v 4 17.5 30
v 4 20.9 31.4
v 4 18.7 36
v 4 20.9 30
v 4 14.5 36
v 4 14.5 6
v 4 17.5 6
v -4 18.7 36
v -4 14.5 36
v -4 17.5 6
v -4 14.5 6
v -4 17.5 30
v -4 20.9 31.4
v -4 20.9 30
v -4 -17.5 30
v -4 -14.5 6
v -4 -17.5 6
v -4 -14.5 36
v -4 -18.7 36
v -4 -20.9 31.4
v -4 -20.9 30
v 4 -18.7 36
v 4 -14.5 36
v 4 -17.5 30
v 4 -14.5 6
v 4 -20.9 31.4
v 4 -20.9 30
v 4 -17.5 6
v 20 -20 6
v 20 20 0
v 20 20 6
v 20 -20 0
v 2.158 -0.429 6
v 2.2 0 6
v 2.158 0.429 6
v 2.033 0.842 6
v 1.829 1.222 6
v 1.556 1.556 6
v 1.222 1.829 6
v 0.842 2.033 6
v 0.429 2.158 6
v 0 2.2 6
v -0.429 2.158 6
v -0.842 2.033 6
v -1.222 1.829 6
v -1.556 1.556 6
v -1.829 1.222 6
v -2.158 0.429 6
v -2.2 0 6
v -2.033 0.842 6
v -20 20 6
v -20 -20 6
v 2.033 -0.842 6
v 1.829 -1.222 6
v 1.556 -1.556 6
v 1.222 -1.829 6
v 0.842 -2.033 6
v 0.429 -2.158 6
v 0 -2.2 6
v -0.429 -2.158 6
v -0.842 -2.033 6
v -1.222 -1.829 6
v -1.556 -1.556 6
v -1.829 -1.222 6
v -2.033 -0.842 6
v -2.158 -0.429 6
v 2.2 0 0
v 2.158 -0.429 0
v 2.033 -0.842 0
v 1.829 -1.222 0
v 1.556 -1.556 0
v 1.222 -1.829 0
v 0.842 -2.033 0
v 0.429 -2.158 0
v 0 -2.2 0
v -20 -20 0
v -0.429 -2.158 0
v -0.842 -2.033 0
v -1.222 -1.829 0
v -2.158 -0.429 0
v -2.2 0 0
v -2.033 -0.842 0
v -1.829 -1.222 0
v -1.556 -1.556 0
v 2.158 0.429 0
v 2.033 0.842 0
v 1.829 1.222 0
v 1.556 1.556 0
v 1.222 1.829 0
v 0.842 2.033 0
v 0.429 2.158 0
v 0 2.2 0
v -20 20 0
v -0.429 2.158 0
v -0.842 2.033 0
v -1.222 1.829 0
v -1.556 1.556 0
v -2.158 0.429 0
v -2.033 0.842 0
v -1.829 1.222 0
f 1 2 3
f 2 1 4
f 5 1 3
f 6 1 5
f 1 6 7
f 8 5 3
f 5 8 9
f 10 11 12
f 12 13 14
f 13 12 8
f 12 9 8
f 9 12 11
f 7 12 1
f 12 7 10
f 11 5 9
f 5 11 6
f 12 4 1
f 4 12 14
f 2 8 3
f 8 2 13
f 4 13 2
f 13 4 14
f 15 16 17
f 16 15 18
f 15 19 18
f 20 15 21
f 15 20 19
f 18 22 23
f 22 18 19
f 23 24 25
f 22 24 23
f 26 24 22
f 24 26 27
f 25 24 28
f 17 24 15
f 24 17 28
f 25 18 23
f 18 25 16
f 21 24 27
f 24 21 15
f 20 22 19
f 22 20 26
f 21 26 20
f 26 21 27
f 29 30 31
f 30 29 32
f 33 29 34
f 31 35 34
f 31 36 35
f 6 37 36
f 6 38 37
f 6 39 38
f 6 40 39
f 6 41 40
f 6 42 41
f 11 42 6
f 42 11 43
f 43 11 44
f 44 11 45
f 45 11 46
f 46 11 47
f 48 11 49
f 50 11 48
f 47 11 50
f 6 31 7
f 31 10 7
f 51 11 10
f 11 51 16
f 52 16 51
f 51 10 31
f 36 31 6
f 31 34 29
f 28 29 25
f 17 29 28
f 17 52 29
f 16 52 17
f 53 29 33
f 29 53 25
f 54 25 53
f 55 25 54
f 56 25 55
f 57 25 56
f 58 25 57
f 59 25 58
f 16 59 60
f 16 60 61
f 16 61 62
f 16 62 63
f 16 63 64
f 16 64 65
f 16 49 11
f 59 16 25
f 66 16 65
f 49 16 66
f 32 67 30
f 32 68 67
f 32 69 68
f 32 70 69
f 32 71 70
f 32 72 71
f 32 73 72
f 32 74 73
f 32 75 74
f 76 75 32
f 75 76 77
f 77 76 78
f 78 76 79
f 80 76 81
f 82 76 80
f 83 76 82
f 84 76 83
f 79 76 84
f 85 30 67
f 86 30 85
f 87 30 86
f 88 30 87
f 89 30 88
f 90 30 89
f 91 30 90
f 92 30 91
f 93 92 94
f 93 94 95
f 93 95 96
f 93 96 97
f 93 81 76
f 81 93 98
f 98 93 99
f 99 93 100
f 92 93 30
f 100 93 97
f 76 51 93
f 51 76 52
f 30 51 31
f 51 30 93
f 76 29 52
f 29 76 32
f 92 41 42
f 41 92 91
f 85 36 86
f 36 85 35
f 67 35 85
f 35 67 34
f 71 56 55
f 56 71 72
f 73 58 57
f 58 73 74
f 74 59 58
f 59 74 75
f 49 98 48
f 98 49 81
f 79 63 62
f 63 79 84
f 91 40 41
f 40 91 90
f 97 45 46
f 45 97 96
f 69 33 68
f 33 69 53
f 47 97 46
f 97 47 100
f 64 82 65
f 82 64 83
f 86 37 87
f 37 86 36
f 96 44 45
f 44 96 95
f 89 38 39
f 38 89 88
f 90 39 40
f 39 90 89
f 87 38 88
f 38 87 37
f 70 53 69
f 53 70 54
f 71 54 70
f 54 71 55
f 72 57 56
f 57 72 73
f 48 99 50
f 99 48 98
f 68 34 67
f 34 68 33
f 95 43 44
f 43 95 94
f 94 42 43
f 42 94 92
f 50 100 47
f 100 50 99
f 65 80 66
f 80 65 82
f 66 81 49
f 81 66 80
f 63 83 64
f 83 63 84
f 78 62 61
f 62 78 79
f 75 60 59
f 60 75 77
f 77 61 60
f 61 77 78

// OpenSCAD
$fn = 32;

// ----------------------------------------------------------------------
// Snap-fit latch: 2 arms, 30 mm tall, 3.6 mm undercut hooks
// ----------------------------------------------------------------------

// --- parameters (mm) ---
base_d = 40;              // base plate depth
base_h = 6;               // base plate thickness
span = 32;                // distance between opposite arms
arm_t = 3;                // arm thickness
arm_d = 8;                // arm width
height = 30;              // free arm length
head_len = 3.6;           // hook reach
head_h = 6;               // hook height
lead = 1.4;               // lead-in ramp thickness
bore_d = 4.4;             // base fixing bore
top_z = 36;               // height of the arm tips above the base

arms = 2;

difference() {
  union() {
    /* base plate, centred on the arm ring */
    translate([-20, -20, 0]) cube([base_d, base_d, base_h]);
    for (a = [0 : 360 / arms : 359]) rotate([0, 0, a]) {
    /* arm, sunk 0.5 mm into the base */
    translate([-arm_d / 2, span / 2 - arm_t / 2, base_h - 0.5]) cube([arm_d, arm_t, height + 0.5]);
    /* hook: a convex hull of a tall inner block and a thin outer lip
       gives a flat undercut below and a lead-in ramp on top */
    hull() {
      translate([-arm_d / 2, span / 2 + arm_t / 2 - 0.6, top_z - head_h]) cube([arm_d, lead + 0.4, head_h]);
      translate([-arm_d / 2, span / 2 + arm_t / 2 - 0.2, top_z - head_h]) cube([arm_d, head_len, lead]);
    }
    }
  }
  translate([0, 0, -2.5]) cylinder(h = base_h + 5, d = bore_d);
}
